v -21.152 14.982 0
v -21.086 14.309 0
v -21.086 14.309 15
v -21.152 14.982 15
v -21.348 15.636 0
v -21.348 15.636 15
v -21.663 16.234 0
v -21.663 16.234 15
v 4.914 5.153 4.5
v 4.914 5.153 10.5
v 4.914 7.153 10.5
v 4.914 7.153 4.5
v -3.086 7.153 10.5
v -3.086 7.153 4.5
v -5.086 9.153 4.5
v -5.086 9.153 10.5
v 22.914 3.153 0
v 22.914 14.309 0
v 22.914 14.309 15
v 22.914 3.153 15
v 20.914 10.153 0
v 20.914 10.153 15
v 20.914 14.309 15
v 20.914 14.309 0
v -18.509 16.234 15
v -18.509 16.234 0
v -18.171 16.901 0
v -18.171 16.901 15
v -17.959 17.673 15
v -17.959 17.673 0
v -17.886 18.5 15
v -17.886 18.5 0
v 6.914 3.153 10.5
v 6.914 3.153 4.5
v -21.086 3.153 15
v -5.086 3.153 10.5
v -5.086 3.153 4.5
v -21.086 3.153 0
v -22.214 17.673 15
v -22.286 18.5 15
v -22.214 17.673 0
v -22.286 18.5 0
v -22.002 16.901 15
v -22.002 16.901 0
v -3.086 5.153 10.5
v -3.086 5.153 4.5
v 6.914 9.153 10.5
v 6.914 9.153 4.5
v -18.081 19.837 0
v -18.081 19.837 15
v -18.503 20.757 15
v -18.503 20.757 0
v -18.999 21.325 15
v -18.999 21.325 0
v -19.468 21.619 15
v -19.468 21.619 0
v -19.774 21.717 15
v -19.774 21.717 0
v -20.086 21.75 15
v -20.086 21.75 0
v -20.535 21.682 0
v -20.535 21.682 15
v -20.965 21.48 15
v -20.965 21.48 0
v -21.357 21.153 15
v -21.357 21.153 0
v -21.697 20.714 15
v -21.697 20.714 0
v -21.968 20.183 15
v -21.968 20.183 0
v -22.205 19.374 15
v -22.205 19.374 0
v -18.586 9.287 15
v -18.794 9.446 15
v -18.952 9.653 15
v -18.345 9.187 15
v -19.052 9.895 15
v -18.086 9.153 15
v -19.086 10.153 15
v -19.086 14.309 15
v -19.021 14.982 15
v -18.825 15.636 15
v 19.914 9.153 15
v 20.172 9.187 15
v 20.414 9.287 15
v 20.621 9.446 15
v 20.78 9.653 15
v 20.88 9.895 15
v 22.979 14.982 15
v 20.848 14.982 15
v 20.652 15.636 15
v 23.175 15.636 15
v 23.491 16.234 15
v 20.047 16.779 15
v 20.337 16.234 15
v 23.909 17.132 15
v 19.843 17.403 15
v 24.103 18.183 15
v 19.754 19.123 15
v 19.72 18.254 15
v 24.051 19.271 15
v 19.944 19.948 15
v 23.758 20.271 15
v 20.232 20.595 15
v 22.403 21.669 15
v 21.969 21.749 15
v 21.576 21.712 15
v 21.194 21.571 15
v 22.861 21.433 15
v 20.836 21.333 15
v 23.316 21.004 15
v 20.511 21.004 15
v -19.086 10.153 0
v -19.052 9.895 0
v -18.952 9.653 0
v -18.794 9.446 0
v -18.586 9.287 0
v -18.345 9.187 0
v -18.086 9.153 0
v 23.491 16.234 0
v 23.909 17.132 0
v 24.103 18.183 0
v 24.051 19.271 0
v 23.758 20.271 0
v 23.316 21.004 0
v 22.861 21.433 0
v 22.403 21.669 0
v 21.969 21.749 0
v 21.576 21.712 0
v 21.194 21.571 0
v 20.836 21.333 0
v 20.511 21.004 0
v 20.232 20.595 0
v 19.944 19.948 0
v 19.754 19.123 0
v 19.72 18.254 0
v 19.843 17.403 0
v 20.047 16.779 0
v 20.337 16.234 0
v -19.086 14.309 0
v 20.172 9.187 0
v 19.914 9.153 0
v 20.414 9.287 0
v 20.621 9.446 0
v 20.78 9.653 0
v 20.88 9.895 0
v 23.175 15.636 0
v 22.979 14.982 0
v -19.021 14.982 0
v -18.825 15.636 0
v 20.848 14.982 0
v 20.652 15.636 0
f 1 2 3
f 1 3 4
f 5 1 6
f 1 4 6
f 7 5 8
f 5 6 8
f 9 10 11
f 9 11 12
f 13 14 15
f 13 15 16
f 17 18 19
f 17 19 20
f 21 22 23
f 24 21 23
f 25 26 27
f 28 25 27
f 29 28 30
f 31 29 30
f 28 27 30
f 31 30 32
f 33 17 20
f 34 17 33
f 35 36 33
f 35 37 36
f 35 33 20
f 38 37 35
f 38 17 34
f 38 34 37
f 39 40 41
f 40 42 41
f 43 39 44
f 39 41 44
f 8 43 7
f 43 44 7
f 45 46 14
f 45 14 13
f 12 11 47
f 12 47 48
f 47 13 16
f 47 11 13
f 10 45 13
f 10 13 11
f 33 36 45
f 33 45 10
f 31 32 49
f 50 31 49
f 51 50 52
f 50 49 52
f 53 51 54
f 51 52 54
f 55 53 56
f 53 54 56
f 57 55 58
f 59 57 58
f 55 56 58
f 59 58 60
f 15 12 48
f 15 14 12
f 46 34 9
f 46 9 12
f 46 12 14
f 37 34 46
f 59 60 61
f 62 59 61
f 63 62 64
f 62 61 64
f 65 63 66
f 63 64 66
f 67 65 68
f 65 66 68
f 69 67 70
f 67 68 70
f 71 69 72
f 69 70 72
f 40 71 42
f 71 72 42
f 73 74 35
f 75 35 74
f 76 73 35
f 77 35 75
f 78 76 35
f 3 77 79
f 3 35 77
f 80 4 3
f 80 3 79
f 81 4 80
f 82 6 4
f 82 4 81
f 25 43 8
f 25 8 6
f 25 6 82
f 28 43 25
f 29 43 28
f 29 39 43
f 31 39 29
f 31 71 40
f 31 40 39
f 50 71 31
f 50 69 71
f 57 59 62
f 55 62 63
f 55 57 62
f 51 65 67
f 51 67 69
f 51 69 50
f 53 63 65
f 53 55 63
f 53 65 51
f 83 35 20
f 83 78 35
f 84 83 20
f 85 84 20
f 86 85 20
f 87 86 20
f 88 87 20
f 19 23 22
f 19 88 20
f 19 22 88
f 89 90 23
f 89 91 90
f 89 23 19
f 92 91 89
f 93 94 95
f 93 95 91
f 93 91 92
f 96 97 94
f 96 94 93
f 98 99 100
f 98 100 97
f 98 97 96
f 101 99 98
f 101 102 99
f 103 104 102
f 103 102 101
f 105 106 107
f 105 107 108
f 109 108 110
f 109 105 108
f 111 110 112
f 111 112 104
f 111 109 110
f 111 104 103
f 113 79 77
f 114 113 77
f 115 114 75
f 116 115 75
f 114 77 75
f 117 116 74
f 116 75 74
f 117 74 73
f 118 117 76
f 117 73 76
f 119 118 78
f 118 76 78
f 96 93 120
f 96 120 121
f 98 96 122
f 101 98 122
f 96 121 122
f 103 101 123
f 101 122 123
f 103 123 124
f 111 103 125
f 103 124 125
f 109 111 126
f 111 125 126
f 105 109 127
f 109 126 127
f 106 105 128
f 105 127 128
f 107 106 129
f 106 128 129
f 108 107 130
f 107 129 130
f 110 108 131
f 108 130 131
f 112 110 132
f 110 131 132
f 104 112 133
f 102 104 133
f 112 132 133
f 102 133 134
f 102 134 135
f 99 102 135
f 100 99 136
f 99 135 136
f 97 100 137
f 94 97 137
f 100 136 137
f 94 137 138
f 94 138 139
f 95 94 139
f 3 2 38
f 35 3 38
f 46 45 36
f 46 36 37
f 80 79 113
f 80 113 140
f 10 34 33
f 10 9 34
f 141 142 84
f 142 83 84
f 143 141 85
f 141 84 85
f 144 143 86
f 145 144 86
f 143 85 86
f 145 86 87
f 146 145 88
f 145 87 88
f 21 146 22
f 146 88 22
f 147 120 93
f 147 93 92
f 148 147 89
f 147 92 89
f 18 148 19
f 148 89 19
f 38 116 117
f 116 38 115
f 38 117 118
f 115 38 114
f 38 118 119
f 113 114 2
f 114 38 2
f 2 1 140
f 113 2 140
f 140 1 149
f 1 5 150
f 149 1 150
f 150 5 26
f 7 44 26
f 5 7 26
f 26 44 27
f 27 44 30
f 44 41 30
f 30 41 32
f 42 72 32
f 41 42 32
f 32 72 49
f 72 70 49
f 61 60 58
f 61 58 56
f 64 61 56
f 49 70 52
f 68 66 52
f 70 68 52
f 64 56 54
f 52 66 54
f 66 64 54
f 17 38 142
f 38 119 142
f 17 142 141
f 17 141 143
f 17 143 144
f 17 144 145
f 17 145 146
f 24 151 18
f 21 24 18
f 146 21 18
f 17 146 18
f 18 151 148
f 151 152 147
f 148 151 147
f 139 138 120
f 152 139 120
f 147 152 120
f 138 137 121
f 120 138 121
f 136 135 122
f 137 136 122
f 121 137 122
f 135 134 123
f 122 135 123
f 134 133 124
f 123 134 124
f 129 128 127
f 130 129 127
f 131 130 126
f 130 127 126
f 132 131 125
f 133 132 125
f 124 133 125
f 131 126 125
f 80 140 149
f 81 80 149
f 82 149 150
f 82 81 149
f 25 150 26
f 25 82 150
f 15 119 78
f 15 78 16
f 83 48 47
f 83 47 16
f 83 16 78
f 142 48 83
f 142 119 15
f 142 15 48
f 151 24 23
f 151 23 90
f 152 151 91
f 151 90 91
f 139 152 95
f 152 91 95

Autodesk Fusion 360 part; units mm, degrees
sketch "Sketch1" plane through (0, 0, 0) normal (0, 0, 1) x (1, 0, 0) in component "Ender5RailClip"
  line L0 (-21.0864, 9.1534) -> (22.9136, 9.1534)
  line L1 (22.9136, 9.1534) -> (22.9136, 3.1534)
  line L2 (22.9136, 3.1534) -> (-21.0864, 3.1534)
  line L3 (-21.0864, 3.1534) -> (-21.0864, 9.1534)
  line L4 (-21.0864, 9.1534) -> (-19.0864, 9.1534)
  line L5 (-19.0864, 9.1534) -> (-19.0864, 16)
  line L6 (-19.0864, 16) -> (-21.0864, 16)
  line L7 (-21.0864, 16) -> (-21.0864, 9.1534)
  line L8 (0.9136, 9.1534) -> (0.9136, 18) construction
  ellipse E0 centre (-20.0864, 18.5) end of major axis (-20.0864, 15.25) minor radius 2.2
  line L9 (-20.0864, 21.75) -> (-20.0864, 15.25)
  line L10 (-22.2864, 18.5) -> (-17.8864, 18.5)
  ellipse E1 centre (21.9136, 18.5) end of major axis (21.9136, 15.25) minor radius 2.2
  line L11 (20.9136, 16) -> (22.9136, 16)
  line L12 (20.9136, 9.1534) -> (20.9136, 16)
  line L13 (22.9136, 16) -> (22.9136, 9.1534)
  point P0 (-20.0864, 16)
  dimension "d2" = 6
  dimension "d3" = 2
  dimension "d4" = 6.5
  dimension "d5" = 4.4
  dimension "d6" = 2.5
  dimension "d19" = 40
extrude "Extrude1" add sketch "Sketch1" along normal blind 15 in component "Ender5RailClip"
fillet "Fillet1" radius 1 2 edges at (20.9136, 9.1534, 7.5) (-19.0864, 9.1534, 7.5) in component "Ender5RailClip"
fillet "Fillet2" radius 3.5 4 edges at (-19.0864, 15.6051, 7.5) (20.9136, 15.6051, 7.5) (-21.0864, 15.6051, 7.5) (22.9136, 15.6051, 7.5) in component "Ender5RailClip"
sketch "Sketch2" plane through (0, 3.1534, 0) normal (0, -1, 0) x (1, 0, 0) in component "Ender5RailClip"
  line L0 (-21.0864, 0) -> (22.9136, 0)
  line L1 (22.9136, 0) -> (22.9136, 15)
  line L2 (22.9136, 15) -> (-21.0864, 15)
  line L3 (-21.0864, 15) -> (-21.0864, 0)
  line L4 (0.9136, 0) -> (0.9136, 15) construction
  line L5 (-21.0864, 7.5) -> (22.9136, 7.5) construction
  line L6 (4.9136, 4.5) -> (-3.0864, 4.5)
  line L7 (-3.0864, 4.5) -> (-3.0864, 10.5)
  line L8 (-3.0864, 10.5) -> (4.9136, 10.5)
  line L9 (4.9136, 10.5) -> (4.9136, 4.5)
  line L10 (4.9136, 4.5) -> (-3.0864, 10.5) construction
  line L11 (-3.0864, 4.5) -> (4.9136, 10.5) construction
  point P0 (0.9136, 7.5)
  dimension "d20" = 8
  dimension "d21" = 6
extrude "Extrude3" cut sketch "Sketch2" against normal through all contours L6 L7 L8 L9 in component "Ender5RailClip"
chamfer "Chamfer2" distance 2 angle 45 4 edges at (-3.0864, 9.1534, 7.5) (-3.0864, 3.1534, 7.5) (4.9136, 9.1534, 7.5) (4.9136, 3.1534, 7.5) in component "Ender5RailClip"
component "Ender5RailClip" placed x (1, 0, 0) y (0, 1, 0) z (0, 0, 1) at (0, 0, 0)
